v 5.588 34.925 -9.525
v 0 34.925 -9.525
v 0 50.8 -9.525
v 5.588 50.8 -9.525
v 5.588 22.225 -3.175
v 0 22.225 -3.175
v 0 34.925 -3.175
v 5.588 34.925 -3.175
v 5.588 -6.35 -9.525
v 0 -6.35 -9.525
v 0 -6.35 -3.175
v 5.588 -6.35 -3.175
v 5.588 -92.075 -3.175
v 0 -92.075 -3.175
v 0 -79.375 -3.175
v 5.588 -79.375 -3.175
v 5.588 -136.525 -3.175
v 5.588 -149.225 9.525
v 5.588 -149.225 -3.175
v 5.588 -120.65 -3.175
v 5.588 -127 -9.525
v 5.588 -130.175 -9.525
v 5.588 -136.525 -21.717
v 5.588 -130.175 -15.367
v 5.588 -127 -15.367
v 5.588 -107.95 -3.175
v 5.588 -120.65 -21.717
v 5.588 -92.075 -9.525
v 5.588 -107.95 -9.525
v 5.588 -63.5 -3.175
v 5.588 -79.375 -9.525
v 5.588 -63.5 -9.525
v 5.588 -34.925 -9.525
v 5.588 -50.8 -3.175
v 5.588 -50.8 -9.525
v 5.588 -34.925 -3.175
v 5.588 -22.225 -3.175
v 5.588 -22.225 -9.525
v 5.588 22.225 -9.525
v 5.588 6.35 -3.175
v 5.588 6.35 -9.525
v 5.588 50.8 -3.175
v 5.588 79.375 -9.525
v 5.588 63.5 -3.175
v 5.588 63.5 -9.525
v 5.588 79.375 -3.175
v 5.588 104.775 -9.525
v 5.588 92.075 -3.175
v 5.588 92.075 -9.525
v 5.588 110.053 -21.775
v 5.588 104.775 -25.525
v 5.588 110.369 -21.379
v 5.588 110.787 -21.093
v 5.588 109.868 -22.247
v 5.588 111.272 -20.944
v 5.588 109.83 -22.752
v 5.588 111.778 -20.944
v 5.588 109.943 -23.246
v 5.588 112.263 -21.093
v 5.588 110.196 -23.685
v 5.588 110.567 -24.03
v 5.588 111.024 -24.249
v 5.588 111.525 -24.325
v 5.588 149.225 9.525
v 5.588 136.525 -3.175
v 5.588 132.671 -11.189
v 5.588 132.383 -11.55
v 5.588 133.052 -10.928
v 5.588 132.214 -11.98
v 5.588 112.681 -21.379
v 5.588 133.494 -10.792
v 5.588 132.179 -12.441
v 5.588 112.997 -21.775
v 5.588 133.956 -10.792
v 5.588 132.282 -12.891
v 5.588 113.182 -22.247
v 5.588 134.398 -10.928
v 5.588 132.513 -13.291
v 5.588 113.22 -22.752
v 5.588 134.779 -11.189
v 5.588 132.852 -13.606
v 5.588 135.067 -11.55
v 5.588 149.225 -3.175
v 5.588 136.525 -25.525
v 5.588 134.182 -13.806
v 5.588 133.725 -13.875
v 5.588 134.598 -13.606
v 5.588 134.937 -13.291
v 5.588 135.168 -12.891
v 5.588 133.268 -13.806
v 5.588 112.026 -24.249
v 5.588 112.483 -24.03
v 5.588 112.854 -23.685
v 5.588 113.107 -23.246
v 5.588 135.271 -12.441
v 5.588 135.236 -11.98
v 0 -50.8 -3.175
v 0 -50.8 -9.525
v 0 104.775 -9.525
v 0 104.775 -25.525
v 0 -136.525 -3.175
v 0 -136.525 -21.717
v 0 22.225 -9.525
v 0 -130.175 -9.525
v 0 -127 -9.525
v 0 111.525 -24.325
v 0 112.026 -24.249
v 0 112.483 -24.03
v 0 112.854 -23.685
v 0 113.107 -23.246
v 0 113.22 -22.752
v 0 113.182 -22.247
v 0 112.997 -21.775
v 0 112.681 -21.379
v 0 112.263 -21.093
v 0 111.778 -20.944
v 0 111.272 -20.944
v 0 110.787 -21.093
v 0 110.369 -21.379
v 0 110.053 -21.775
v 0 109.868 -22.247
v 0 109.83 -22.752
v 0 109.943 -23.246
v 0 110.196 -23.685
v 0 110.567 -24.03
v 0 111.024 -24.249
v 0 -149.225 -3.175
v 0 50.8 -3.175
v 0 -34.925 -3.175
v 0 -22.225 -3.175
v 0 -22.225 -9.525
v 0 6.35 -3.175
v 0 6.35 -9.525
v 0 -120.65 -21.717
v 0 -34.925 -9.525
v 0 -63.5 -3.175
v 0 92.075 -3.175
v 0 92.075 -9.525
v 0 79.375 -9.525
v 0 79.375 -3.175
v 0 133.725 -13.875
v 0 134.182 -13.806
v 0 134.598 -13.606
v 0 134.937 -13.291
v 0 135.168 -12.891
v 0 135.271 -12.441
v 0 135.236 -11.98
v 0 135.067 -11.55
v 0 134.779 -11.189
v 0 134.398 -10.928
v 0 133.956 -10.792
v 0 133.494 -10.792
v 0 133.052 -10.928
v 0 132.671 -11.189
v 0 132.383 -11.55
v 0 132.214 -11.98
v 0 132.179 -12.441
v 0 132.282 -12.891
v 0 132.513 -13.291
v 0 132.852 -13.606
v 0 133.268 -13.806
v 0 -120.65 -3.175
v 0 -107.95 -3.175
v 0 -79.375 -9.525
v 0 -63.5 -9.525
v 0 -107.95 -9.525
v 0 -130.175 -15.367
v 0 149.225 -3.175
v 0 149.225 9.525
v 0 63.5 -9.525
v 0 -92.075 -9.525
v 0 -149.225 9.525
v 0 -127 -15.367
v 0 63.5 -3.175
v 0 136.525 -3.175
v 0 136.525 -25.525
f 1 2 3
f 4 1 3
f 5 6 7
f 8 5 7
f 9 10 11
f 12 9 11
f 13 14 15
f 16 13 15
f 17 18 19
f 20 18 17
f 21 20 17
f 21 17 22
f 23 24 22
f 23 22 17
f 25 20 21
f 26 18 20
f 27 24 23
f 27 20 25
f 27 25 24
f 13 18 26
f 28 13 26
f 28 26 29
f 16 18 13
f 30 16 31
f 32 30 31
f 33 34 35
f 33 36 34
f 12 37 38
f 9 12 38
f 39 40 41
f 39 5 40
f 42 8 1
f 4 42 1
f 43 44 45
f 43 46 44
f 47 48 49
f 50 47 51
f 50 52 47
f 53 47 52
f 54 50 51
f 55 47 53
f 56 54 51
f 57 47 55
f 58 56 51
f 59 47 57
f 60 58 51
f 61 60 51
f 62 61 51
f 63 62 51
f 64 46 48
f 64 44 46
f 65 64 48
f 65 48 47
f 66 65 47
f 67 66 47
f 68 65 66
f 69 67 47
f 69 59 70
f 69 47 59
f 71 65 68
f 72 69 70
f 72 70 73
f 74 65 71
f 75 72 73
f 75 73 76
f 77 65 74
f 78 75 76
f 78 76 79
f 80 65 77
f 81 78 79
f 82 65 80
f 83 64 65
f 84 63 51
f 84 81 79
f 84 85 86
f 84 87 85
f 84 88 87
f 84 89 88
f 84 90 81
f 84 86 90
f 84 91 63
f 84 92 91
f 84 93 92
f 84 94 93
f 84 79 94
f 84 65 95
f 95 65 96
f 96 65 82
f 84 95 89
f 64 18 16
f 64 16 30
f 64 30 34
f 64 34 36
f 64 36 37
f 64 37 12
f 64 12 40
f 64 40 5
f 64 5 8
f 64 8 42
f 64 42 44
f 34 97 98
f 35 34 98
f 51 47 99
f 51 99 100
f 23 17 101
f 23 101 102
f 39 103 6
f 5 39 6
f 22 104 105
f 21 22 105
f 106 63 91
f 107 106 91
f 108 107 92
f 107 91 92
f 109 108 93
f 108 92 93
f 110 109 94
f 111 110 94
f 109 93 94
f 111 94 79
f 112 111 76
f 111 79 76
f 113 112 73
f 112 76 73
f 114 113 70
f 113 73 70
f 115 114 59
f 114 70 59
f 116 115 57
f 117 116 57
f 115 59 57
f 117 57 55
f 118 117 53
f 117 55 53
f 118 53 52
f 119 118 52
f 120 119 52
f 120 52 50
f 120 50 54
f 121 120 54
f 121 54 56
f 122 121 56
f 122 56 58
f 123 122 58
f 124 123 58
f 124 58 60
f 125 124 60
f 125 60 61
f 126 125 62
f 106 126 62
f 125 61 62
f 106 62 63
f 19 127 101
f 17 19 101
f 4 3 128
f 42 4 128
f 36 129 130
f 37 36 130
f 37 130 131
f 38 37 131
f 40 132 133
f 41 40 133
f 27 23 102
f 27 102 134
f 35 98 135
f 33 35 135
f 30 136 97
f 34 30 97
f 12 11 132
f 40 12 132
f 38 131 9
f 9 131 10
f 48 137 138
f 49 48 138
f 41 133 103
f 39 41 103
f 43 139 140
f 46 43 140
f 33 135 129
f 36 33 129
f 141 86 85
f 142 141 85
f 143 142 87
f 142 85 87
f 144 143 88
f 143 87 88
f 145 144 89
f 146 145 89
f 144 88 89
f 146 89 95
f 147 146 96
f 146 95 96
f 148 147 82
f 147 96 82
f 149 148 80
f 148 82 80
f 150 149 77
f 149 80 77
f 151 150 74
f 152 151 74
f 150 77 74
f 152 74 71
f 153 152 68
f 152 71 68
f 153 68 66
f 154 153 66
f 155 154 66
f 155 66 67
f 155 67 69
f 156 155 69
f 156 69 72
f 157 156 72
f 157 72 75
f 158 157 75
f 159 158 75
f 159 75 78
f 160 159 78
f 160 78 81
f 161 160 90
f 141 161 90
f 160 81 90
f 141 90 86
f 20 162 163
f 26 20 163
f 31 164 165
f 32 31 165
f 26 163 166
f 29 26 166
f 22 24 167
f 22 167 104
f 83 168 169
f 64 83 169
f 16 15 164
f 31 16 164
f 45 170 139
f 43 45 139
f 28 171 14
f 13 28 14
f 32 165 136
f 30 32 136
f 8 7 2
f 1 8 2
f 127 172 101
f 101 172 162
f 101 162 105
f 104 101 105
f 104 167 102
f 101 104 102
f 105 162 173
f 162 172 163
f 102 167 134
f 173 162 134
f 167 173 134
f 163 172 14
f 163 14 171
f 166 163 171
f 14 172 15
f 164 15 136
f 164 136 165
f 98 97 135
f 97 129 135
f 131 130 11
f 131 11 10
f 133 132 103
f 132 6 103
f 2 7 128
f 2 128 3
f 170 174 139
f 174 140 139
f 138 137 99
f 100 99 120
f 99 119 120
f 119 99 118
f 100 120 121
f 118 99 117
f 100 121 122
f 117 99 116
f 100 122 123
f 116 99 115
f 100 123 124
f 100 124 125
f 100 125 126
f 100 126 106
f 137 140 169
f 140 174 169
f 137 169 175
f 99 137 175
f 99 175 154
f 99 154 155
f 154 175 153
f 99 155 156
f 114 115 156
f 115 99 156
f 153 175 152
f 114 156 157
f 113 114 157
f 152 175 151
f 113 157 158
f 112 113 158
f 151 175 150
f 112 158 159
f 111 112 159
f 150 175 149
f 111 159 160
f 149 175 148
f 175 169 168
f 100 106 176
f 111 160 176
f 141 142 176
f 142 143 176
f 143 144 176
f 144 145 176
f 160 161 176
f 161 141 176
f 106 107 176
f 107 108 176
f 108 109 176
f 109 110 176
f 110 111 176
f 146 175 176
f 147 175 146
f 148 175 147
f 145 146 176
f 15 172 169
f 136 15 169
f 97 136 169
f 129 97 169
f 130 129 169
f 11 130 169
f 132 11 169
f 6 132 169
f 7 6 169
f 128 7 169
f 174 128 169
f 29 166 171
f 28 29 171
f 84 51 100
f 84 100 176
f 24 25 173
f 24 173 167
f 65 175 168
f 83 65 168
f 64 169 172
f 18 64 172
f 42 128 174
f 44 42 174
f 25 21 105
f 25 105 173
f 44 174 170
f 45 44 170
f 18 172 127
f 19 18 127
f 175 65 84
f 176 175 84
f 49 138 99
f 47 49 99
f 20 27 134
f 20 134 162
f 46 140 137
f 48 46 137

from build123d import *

# Parameters (mm, degrees)
BOSS_EXTRUDE1_DEPTH = 5.588
SKETCH2_W           = 22.3499934
SKETCH2_H           = 31.75
SKETCH2_R           = 1.55
SKETCH2_R_2         = 1.7
BOSS_EXTRUDE2_DEPTH = 5.588


with BuildPart() as part:
    # Sketch1 → Boss-Extrude1 (new body)
    with BuildSketch(Plane(origin=(0, 0, 0), x_dir=(0, 0, -1), z_dir=(1, 0, 0))):
        Polygon((3.175, 120.65), (9.525, 120.65), (9.525, 136.525), (3.175, 136.525), (3.175, 149.225), (-9.525, 149.225), (-9.525, -149.225), (3.175, -149.225), (3.175, -136.525), (9.525, -136.525), (9.525, -120.65), (3.175, -120.65), (3.175, -107.95), (9.525, -107.95), (9.525, -92.075), (3.175, -92.075), (3.175, -79.375), (9.525, -79.375), (9.525, -63.5), (3.175, -63.5), (3.175, -50.8), (9.525, -50.8), (9.525, -34.925), (3.175, -34.925), (3.175, -22.225), (9.525, -22.225), (9.525, -6.35), (3.175, -6.35), (3.175, 6.35), (9.525, 6.35), (9.525, 22.225), (3.175, 22.225), (3.175, 34.925), (9.525, 34.925), (9.525, 50.8), (3.175, 50.8), (3.175, 63.5), (9.525, 63.5), (9.525, 79.375), (3.175, 79.375), (3.175, 92.075), (9.525, 92.075), (9.525, 107.95), (3.175, 107.95), align=None)
    extrude(amount=BOSS_EXTRUDE1_DEPTH)

    # Sketch2 → Boss-Extrude2 (add)
    with BuildSketch(Plane(origin=(5.588, 0, 0), x_dir=(0, 0, -1), z_dir=(1, 0, 0))):
        Polygon((21.717, -120.65), (9.525, -120.65), (9.525, -127), (15.367, -127), (15.367, -130.175), (9.525, -130.175), (9.525, -136.525), (21.717, -136.525), align=None)
        with Locations((14.3499967, 120.65)):
            Rectangle(SKETCH2_W, SKETCH2_H)
        with Locations((12.3249992, 133.7250056)):
            Circle(SKETCH2_R, mode=Mode.SUBTRACT)
        with Locations((22.6249992, 111.5250056)):
            Circle(SKETCH2_R_2, mode=Mode.SUBTRACT)
    extrude(amount=-BOSS_EXTRUDE2_DEPTH)


solid = part.part
